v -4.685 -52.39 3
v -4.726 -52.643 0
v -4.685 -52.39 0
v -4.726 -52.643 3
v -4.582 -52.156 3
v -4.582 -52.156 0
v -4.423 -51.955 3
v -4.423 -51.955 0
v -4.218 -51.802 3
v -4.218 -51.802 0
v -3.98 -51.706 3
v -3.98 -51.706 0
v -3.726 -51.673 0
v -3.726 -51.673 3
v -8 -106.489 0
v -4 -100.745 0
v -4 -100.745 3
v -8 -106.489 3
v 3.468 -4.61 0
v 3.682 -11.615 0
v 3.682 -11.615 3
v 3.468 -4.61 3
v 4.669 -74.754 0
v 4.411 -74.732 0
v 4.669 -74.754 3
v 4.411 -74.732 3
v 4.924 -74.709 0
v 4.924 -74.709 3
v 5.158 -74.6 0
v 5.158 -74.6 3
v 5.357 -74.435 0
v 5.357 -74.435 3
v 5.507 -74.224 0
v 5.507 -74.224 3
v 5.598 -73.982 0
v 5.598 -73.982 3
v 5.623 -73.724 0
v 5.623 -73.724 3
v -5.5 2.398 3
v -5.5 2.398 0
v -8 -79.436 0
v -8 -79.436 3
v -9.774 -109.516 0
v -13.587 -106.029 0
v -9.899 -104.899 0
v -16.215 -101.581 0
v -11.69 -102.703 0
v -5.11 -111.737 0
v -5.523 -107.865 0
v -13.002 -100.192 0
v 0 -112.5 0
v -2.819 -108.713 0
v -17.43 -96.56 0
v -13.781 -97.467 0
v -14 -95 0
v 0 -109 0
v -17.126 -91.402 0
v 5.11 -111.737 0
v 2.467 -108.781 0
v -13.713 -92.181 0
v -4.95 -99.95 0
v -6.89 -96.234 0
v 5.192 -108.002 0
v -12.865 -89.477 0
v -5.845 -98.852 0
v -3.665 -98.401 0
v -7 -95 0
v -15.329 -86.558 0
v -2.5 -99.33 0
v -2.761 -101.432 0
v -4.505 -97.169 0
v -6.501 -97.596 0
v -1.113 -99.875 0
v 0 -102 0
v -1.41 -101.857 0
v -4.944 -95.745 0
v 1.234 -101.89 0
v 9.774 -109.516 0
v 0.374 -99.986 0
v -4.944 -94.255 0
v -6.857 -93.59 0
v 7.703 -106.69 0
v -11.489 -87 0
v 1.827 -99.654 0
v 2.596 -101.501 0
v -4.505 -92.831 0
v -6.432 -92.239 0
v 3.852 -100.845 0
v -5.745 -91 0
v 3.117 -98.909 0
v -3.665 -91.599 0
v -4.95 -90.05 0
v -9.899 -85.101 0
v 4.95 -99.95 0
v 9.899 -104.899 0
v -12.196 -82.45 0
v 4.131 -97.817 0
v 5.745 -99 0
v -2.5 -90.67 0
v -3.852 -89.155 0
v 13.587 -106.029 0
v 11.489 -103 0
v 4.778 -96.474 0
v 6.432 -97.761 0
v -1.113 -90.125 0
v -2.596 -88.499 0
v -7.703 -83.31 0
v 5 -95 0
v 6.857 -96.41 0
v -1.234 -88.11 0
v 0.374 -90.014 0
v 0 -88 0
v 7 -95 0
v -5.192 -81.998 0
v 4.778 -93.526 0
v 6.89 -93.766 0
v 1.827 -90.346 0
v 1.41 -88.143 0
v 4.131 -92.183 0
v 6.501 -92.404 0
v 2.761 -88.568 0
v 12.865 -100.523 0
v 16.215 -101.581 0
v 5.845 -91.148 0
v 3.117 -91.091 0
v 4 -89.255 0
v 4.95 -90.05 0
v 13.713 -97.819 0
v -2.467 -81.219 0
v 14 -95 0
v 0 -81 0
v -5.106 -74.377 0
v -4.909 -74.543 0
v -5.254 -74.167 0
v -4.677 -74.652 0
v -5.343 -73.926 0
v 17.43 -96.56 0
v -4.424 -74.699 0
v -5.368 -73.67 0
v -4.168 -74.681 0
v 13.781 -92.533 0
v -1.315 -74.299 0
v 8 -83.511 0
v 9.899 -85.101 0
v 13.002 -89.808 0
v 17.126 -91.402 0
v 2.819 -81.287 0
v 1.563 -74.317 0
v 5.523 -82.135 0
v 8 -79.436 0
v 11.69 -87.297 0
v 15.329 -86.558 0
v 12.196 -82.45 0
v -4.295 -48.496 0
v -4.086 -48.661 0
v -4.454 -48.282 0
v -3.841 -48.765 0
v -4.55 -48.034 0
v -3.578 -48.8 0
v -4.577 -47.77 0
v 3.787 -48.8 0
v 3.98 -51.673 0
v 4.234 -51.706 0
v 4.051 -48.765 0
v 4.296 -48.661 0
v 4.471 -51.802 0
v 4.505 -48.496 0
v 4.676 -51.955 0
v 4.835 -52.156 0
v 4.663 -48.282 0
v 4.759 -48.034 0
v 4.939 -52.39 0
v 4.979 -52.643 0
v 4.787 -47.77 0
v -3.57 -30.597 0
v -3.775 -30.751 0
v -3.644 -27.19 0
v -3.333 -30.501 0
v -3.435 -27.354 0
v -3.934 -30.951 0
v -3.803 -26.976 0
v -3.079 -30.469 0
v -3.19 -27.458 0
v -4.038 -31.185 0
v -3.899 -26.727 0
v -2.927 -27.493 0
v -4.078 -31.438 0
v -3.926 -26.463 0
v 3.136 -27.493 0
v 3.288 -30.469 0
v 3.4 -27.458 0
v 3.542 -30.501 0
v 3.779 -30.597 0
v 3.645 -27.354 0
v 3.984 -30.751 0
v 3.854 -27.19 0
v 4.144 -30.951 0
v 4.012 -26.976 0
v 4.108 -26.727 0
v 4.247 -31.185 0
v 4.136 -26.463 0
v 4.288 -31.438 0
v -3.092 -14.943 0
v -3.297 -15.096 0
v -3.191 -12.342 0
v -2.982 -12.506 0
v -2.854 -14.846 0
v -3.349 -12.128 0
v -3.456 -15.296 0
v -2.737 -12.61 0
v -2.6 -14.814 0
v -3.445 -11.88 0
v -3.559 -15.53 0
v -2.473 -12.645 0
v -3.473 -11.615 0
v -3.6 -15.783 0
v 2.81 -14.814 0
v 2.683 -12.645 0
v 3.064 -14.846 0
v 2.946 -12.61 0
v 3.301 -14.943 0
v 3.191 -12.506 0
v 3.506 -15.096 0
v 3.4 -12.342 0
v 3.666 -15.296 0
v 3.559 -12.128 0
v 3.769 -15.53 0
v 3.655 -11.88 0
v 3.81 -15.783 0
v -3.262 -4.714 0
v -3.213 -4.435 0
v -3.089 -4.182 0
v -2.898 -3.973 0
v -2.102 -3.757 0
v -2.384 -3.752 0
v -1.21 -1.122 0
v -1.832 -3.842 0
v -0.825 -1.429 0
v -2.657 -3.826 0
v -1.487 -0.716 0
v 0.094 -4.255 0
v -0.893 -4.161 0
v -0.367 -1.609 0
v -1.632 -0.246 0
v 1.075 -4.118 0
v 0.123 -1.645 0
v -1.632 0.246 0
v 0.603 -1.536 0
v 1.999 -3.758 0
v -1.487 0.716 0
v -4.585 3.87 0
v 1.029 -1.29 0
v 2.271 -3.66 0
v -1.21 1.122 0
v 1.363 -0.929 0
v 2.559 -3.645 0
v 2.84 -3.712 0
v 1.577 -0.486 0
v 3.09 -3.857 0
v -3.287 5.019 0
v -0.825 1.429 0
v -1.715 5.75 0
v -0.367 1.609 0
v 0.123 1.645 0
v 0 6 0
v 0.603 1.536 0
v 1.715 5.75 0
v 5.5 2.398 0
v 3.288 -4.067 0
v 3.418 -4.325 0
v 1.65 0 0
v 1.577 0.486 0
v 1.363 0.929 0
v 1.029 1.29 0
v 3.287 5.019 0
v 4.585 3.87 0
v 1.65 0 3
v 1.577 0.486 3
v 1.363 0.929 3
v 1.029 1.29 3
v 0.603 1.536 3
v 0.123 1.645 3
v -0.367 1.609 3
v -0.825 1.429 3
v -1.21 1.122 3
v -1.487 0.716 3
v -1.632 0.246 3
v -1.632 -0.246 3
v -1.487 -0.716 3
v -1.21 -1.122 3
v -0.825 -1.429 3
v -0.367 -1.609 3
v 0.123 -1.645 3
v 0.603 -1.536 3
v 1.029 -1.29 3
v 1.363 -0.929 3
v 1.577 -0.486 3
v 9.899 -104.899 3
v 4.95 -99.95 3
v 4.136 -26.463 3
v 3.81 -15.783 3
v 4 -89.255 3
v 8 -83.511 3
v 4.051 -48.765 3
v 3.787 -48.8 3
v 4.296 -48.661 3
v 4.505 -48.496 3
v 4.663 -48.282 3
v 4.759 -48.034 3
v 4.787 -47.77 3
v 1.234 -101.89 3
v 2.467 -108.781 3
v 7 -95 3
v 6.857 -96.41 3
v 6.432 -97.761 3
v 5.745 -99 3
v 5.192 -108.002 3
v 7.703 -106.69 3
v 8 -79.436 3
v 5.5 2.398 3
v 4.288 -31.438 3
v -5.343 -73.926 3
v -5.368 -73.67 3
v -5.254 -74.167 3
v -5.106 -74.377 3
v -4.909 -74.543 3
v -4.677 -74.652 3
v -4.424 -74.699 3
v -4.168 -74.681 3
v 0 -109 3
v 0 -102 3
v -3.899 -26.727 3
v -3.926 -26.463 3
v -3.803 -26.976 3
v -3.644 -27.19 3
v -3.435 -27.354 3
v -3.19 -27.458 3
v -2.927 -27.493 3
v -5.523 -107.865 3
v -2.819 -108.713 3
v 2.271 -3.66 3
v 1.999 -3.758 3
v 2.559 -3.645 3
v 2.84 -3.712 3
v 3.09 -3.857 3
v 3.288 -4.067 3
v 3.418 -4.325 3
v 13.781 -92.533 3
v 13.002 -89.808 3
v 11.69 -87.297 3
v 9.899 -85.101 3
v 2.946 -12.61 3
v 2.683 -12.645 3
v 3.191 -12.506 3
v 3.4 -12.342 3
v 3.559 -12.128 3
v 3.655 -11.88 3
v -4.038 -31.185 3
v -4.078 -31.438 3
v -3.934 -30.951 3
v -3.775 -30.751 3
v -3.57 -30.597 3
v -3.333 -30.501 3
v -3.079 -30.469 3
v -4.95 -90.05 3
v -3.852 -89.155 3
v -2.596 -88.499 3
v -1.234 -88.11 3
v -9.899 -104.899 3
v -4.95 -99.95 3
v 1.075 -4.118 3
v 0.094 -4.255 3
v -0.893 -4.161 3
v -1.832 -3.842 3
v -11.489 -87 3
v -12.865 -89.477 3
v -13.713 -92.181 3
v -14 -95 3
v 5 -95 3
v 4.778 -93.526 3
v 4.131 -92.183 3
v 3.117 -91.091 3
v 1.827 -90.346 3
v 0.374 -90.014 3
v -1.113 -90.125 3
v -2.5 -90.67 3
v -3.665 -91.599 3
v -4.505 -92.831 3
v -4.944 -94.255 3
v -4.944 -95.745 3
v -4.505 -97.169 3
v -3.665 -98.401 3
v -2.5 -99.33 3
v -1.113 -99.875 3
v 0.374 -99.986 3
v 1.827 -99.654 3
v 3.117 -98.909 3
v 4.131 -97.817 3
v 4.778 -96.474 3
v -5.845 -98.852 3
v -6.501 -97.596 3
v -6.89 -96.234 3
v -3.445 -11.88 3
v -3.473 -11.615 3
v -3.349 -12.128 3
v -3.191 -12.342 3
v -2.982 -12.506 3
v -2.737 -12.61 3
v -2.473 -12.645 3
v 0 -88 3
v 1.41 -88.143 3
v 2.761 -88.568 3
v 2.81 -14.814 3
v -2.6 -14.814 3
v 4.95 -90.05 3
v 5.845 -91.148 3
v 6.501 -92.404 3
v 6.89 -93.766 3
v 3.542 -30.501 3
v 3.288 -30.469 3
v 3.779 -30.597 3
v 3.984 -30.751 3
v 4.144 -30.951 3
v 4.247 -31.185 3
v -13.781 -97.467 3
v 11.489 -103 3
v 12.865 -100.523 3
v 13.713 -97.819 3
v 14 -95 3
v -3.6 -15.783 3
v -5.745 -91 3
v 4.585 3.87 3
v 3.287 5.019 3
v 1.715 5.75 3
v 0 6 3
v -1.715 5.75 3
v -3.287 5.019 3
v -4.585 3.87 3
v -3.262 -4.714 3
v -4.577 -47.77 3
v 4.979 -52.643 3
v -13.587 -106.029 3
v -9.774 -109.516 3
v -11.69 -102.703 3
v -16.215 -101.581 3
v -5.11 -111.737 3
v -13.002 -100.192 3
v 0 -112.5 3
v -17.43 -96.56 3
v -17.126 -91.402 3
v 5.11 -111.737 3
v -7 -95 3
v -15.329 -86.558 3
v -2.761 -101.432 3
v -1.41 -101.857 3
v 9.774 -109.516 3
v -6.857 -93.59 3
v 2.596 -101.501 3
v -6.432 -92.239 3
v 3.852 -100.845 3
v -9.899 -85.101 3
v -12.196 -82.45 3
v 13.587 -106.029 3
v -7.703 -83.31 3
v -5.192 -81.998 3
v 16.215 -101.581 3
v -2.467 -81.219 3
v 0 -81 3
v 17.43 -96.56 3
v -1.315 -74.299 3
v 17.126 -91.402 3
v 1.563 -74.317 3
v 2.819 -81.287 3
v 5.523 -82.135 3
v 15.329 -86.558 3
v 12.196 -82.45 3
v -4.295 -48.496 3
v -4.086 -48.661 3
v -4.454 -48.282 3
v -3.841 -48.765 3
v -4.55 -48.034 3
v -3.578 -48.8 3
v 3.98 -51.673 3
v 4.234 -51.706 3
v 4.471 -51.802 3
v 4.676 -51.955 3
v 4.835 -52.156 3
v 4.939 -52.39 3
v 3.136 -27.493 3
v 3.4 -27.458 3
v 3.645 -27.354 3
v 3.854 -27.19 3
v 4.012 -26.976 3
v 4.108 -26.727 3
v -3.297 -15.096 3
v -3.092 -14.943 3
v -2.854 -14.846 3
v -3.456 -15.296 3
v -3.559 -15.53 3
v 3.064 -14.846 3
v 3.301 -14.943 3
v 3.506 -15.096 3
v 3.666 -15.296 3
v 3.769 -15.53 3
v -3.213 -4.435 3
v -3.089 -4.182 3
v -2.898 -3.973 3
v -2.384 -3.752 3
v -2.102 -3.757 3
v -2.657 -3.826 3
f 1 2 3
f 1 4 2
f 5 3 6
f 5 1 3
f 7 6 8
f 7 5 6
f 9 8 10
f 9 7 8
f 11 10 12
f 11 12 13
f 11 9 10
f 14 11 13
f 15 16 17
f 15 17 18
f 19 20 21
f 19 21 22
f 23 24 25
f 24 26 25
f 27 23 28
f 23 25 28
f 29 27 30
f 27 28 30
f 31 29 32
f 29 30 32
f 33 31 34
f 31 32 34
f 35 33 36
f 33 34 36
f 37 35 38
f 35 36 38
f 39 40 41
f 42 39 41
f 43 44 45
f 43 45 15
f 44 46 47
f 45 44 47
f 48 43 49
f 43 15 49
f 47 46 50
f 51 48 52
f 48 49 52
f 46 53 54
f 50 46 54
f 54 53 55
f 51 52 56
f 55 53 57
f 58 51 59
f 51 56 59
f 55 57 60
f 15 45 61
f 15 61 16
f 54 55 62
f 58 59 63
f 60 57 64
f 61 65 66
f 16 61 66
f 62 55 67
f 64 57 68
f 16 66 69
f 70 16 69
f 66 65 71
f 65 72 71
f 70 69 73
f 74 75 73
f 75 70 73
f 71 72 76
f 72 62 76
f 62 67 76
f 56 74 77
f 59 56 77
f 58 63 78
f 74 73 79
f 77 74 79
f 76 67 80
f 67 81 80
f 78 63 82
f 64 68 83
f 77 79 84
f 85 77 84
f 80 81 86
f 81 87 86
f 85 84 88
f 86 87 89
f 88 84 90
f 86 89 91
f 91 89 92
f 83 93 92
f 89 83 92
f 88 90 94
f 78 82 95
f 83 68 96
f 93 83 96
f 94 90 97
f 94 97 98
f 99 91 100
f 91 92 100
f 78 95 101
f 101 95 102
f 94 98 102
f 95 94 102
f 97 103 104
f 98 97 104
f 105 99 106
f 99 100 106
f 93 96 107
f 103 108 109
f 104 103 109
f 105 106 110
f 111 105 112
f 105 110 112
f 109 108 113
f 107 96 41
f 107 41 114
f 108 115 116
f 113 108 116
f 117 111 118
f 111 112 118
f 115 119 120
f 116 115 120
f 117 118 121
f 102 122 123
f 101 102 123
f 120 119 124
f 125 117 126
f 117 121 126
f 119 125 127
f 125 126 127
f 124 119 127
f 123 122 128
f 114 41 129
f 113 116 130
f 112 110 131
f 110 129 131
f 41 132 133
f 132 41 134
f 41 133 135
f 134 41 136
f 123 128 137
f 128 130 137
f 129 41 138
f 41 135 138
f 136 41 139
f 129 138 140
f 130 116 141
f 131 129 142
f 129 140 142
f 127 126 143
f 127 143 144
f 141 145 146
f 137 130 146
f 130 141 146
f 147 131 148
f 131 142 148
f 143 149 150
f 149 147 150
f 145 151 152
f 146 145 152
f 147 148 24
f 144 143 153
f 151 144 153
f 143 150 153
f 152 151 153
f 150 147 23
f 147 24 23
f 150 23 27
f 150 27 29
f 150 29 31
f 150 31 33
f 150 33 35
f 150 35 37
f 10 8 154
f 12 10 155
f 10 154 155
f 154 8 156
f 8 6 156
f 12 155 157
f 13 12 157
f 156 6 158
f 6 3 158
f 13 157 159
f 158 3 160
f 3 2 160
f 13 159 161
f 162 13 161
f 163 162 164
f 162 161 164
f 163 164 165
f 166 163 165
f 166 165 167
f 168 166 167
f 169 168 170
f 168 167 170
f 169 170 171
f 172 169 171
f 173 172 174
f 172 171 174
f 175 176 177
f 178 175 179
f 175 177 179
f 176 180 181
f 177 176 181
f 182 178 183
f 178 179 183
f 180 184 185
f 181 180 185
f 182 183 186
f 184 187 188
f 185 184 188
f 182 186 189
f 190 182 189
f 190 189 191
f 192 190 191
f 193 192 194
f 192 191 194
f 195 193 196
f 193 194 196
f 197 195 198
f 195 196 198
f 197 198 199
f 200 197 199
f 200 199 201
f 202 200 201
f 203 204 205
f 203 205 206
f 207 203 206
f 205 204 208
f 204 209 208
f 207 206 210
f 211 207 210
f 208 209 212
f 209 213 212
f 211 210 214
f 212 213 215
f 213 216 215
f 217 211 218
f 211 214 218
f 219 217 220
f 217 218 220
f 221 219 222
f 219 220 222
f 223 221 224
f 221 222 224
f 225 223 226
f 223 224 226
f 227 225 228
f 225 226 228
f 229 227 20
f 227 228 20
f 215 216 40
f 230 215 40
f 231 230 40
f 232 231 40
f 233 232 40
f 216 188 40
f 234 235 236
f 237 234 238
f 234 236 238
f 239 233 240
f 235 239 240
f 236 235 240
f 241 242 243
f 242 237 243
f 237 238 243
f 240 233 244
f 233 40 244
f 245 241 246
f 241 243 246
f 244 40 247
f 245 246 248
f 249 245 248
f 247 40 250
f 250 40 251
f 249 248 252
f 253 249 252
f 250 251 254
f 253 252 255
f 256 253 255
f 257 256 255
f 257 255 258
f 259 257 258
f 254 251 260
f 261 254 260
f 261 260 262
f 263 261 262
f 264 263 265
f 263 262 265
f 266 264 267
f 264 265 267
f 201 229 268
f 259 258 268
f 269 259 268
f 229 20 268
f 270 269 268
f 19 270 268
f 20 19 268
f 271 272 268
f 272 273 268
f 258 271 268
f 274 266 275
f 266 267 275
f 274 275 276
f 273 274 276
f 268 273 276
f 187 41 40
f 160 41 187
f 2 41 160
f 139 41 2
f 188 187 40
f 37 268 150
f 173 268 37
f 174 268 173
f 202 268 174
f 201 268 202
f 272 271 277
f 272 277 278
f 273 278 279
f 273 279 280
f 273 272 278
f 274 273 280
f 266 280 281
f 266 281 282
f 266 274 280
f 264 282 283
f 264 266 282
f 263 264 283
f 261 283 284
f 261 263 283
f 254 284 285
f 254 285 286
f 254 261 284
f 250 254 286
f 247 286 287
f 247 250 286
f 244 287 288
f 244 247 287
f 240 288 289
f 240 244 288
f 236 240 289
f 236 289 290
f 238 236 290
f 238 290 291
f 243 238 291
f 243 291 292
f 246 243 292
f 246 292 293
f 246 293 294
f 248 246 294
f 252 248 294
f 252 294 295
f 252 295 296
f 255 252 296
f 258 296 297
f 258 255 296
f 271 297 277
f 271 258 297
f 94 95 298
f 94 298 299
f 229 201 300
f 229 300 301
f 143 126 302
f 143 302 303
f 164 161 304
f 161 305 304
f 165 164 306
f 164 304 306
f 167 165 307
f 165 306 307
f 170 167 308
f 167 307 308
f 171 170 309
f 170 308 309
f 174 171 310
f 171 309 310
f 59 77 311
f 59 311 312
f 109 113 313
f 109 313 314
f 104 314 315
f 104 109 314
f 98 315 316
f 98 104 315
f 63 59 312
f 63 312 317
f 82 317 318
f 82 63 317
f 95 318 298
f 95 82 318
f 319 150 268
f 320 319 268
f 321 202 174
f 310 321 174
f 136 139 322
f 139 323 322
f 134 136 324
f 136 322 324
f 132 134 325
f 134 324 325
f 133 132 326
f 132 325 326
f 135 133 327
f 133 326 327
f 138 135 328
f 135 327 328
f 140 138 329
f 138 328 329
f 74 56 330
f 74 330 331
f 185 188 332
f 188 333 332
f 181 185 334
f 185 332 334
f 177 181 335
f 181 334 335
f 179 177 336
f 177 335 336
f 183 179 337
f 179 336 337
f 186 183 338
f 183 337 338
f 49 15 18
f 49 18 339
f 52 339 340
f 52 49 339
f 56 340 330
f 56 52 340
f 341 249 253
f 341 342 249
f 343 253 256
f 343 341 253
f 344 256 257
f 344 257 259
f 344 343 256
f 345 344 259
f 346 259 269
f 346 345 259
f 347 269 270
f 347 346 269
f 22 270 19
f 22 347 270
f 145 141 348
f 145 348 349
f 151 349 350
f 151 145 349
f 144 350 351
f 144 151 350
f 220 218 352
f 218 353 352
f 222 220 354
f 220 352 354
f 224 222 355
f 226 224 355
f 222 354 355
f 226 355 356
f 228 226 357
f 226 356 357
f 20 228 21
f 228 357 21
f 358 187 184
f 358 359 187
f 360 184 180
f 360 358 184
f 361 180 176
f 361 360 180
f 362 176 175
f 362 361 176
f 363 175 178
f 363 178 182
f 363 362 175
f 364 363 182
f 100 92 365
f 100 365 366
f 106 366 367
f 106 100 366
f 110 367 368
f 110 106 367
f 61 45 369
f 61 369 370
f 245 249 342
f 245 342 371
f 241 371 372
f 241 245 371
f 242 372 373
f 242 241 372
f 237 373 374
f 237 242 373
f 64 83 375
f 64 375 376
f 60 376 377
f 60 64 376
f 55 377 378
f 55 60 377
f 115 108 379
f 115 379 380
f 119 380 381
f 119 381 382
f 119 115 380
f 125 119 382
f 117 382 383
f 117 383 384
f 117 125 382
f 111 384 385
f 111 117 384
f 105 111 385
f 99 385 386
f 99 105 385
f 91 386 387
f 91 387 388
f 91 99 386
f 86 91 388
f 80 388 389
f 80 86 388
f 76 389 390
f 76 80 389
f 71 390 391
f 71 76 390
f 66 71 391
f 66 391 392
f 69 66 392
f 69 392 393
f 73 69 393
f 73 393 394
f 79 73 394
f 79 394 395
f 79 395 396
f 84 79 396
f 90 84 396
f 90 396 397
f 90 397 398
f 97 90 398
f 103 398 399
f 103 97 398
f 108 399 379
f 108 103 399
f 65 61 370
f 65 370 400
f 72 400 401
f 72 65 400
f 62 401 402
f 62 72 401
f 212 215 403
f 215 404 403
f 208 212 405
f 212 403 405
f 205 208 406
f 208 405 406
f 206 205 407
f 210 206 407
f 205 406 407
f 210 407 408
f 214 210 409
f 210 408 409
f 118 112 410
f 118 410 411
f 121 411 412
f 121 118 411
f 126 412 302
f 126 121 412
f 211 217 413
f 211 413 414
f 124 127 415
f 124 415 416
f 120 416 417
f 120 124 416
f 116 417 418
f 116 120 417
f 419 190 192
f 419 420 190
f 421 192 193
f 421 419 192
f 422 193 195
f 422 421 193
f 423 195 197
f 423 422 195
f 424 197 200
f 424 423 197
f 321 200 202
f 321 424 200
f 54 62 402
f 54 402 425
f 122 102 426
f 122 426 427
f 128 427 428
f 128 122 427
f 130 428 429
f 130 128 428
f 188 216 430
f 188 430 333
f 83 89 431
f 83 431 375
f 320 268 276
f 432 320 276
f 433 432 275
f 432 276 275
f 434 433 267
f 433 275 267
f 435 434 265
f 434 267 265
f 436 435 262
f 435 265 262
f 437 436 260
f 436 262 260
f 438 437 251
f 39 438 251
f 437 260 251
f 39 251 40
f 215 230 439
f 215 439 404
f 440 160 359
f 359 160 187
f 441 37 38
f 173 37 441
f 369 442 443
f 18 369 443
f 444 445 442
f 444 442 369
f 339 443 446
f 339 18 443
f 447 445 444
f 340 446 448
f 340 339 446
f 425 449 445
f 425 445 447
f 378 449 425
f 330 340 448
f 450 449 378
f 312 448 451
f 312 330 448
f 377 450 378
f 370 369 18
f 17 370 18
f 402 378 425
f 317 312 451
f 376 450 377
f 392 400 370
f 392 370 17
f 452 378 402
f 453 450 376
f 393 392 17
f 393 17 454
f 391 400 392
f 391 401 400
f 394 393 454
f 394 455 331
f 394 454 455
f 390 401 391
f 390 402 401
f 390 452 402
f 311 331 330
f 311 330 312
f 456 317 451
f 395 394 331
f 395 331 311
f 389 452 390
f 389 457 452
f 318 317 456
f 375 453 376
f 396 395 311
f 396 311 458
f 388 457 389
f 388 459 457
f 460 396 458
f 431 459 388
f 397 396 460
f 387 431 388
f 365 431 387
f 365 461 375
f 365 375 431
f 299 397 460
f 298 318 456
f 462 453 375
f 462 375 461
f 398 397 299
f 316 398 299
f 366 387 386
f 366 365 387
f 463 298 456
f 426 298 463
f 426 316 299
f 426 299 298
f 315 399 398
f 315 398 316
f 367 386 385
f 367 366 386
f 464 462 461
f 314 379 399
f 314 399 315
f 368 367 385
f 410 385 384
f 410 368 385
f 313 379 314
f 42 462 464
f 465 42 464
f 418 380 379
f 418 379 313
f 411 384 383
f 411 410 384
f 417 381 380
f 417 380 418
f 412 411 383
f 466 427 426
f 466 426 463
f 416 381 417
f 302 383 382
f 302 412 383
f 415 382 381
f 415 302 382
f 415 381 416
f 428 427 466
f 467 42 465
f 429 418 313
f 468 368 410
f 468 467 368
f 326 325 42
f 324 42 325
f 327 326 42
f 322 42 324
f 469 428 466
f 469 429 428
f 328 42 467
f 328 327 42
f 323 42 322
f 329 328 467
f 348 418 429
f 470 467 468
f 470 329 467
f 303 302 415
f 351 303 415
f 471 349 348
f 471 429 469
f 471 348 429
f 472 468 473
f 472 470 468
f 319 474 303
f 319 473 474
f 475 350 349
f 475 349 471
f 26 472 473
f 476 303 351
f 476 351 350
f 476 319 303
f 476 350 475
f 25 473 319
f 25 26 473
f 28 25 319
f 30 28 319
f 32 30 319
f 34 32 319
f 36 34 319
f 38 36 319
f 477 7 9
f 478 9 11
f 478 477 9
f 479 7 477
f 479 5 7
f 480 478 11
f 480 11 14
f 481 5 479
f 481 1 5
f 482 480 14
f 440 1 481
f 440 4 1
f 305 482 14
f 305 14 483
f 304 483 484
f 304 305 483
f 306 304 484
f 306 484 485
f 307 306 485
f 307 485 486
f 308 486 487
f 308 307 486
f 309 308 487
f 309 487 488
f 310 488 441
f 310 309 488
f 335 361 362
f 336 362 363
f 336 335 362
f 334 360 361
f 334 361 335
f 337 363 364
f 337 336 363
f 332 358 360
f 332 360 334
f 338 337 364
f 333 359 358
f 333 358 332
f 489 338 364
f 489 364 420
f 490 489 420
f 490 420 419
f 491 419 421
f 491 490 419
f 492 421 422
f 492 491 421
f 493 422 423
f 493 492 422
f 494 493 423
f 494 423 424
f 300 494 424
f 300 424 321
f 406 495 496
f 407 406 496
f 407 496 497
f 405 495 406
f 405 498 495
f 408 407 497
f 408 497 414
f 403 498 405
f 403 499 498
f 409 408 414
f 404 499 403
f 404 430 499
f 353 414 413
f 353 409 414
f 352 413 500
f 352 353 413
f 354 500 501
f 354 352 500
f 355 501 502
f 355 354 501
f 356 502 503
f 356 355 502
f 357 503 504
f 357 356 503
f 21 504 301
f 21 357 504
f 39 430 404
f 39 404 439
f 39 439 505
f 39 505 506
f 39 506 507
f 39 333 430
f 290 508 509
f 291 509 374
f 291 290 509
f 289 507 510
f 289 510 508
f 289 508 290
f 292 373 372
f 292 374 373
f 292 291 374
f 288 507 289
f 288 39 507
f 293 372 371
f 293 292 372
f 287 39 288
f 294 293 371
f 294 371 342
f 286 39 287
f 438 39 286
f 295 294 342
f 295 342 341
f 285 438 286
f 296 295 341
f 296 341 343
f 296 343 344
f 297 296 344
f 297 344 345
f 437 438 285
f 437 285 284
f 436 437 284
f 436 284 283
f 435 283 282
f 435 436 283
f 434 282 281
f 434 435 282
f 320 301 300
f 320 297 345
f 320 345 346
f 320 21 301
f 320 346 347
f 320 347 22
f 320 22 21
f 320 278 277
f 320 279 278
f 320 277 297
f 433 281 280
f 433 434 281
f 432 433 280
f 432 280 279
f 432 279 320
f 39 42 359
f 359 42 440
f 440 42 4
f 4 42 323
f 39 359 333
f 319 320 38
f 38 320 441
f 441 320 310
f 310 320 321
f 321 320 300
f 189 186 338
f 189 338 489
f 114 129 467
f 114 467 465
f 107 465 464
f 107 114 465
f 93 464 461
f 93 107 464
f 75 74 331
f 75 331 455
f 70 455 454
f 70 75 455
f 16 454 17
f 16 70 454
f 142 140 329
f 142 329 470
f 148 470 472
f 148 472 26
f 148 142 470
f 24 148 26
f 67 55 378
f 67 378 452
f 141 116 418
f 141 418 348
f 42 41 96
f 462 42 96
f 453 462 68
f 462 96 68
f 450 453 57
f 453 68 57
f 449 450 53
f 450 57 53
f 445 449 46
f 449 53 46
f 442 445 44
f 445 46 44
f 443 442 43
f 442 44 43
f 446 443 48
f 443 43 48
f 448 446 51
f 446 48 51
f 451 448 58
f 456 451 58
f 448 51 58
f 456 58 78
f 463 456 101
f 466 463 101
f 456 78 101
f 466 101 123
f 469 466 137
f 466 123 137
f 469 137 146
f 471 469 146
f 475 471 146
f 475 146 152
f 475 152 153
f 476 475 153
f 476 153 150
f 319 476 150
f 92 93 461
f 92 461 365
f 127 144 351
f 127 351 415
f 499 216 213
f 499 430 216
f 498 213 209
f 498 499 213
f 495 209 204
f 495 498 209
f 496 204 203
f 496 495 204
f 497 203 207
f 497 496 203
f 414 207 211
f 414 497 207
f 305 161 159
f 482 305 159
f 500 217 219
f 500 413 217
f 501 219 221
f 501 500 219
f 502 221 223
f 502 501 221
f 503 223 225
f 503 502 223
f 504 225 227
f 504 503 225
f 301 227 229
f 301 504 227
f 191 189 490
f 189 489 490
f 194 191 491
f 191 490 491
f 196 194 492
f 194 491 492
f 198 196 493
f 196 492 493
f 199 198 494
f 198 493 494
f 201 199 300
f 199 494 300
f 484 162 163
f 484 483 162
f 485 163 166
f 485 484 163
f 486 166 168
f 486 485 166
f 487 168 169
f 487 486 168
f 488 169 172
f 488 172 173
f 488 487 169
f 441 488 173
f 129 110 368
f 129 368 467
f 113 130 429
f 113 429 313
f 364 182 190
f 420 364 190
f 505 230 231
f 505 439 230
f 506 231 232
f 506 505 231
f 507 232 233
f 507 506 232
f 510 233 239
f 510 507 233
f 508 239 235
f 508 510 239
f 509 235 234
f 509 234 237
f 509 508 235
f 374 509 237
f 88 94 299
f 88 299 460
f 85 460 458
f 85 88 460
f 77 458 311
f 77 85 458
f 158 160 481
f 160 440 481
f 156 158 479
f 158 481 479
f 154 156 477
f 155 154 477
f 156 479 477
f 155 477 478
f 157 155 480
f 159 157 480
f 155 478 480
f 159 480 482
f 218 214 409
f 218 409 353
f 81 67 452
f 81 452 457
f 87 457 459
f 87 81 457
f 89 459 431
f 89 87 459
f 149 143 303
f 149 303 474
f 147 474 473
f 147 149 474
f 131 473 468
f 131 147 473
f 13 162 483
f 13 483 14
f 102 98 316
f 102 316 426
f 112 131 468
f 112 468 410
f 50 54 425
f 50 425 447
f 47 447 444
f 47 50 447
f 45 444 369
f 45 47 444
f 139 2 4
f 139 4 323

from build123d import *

# Parameters (mm, degrees)
SKETCH_1_R      = 1.65
SKETCH_1_R_2    = 5
EXTRUDE_1_DEPTH = 3
FILLET_1_R      = 1


with BuildPart() as part:
    # 草图1 → 凸台-拉伸1 (new body)
    with BuildSketch(Plane.XY):
        with BuildLine():
            Line((-5.5, 2.397915762), (-8, -79.435617584))
            ThreePointArc((-8, -79.435617584), (0, -112.5), (8, -79.435617584))
            Line((8, -79.435617584), (5.5, 2.397915762))
            ThreePointArc((5.5, 2.397915762), (0, 6), (-5.5, 2.397915762))
        make_face()
        Circle(SKETCH_1_R, mode=Mode.SUBTRACT)
        with Locations((0, -95)):
            Circle(SKETCH_1_R_2, mode=Mode.SUBTRACT)
        with BuildLine():
            Line((-3.203324226, -2.80246125), (-3.504023082, -12.645361196))
            Line((-3.504023082, -12.645361196), (3.713679897, -12.645361196))
            Line((3.713679897, -12.645361196), (3.40536458, -2.553148492))
            ThreePointArc((3.40536458, -2.553148492), (0.16045027, -4.253155401), (-3.203324226, -2.80246125))
        make_face(mode=Mode.SUBTRACT)
        Polygon((-3.570265581, -14.813704302), (-3.957626018, -27.493333612), (4.167282834, -27.493333612), (3.779922396, -14.813704302), align=None, mode=Mode.SUBTRACT)
        Polygon((-4.048518432, -30.468552565), (4.258175248, -30.468552565), (4.818203506, -48.800189025), (-4.60854669, -48.800189025), align=None, mode=Mode.SUBTRACT)
        with BuildLine():
            Line((-4.696319338, -51.673287395), (-5.408181825, -74.974976421))
            ThreePointArc((-5.408181825, -74.974976421), (0.132605518, -74.257955362), (5.66377239, -75.045760292))
            Line((5.66377239, -75.045760292), (4.949747468, -51.673287395))
            Line((4.949747468, -51.673287395), (-4.696319338, -51.673287395))
        make_face(mode=Mode.SUBTRACT)
        with BuildLine():
            Line((0, -81), (0, -88))
            ThreePointArc((0, -88), (2.096194278, -88.321229937), (3.999999882, -89.255437272))
            Line((3.999999882, -89.255437272), (7.999999765, -83.510874543))
            ThreePointArc((7.999999765, -83.510874543), (4.192388556, -81.642459875), (0, -81))
        make_face(mode=Mode.SUBTRACT)
        with BuildLine():
            Line((9.899494937, -85.100505063), (4.949747468, -90.050252532))
            ThreePointArc((4.949747468, -90.050252532), (6.20483679, -91.759629587), (6.890446302, -93.766407781))
            Line((6.890446302, -93.766407781), (13.780892604, -92.532815563))
            ThreePointArc((13.780892604, -92.532815563), (12.40967358, -88.519259175), (9.899494937, -85.100505063))
        make_face(mode=Mode.SUBTRACT)
        with BuildLine():
            Line((14, -95), (7, -95))
            ThreePointArc((7, -95), (6.678770063, -97.096194278), (5.744562728, -98.999999882))
            Line((5.744562728, -98.999999882), (11.489125457, -102.999999765))
            ThreePointArc((11.489125457, -102.999999765), (13.357540125, -99.192388556), (14, -95))
        make_face(mode=Mode.SUBTRACT)
        with BuildLine():
            Line((9.899494937, -104.899494937), (4.949747468, -99.949747468))
            ThreePointArc((4.949747468, -99.949747468), (3.240370413, -101.20483679), (1.233592219, -101.890446302))
            Line((1.233592219, -101.890446302), (2.467184437, -108.780892604))
            ThreePointArc((2.467184437, -108.780892604), (6.480740825, -107.40967358), (9.899494937, -104.899494937))
        make_face(mode=Mode.SUBTRACT)
        with BuildLine():
            Line((0, -109), (0, -102))
            ThreePointArc((0, -102), (-2.096194278, -101.678770063), (-3.999999882, -100.744562728))
            Line((-3.999999882, -100.744562728), (-7.999999765, -106.489125457))
            ThreePointArc((-7.999999765, -106.489125457), (-4.192388556, -108.357540125), (0, -109))
        make_face(mode=Mode.SUBTRACT)
        with BuildLine():
            Line((-9.899494937, -104.899494937), (-4.949747468, -99.949747468))
            ThreePointArc((-4.949747468, -99.949747468), (-6.20483679, -98.240370413), (-6.890446302, -96.233592219))
            Line((-6.890446302, -96.233592219), (-13.780892604, -97.467184437))
            ThreePointArc((-13.780892604, -97.467184437), (-12.40967358, -101.480740825), (-9.899494937, -104.899494937))
        make_face(mode=Mode.SUBTRACT)
        with BuildLine():
            Line((-14, -95), (-7, -95))
            ThreePointArc((-7, -95), (-6.678770063, -92.903805722), (-5.744562728, -91.000000118))
            Line((-5.744562728, -91.000000118), (-11.489125457, -87.000000235))
            ThreePointArc((-11.489125457, -87.000000235), (-13.357540125, -90.807611444), (-14, -95))
        make_face(mode=Mode.SUBTRACT)
        with BuildLine():
            Line((-9.899494937, -85.100505063), (-4.949747468, -90.050252532))
            ThreePointArc((-4.949747468, -90.050252532), (-3.240370413, -88.79516321), (-1.233592219, -88.109553698))
            Line((-1.233592219, -88.109553698), (-2.467184437, -81.219107396))
            ThreePointArc((-2.467184437, -81.219107396), (-6.480740825, -82.59032642), (-9.899494937, -85.100505063))
        make_face(mode=Mode.SUBTRACT)
    extrude(amount=EXTRUDE_1_DEPTH)

    # 圆角1
    fillet_1_edges = [part.edges().sort_by_distance(p)[0] for p in [
        (3.40536458, -2.553148492, 1.5),
        (-3.203324226, -2.80246125, 1.5),
        (-3.504023082, -12.645361196, 1.5),
        (3.713679897, -12.645361196, 1.5),
        (-5.408181825, -74.974976421, 1.5),
        (5.66377239, -75.045760292, 1.5),
        (4.949747468, -51.673287395, 1.5),
        (-4.696319338, -51.673287395, 1.5),
        (3.779922396, -14.813704302, 1.5),
        (-3.570265581, -14.813704302, 1.5),
        (-3.957626018, -27.493333612, 1.5),
        (4.167282834, -27.493333612, 1.5),
        (-4.048518432, -30.468552565, 1.5),
        (-4.60854669, -48.800189025, 1.5),
        (4.818203506, -48.800189025, 1.5),
        (4.258175248, -30.468552565, 1.5),
    ]]
    fillet(fillet_1_edges, radius=FILLET_1_R)


solid = part.part
